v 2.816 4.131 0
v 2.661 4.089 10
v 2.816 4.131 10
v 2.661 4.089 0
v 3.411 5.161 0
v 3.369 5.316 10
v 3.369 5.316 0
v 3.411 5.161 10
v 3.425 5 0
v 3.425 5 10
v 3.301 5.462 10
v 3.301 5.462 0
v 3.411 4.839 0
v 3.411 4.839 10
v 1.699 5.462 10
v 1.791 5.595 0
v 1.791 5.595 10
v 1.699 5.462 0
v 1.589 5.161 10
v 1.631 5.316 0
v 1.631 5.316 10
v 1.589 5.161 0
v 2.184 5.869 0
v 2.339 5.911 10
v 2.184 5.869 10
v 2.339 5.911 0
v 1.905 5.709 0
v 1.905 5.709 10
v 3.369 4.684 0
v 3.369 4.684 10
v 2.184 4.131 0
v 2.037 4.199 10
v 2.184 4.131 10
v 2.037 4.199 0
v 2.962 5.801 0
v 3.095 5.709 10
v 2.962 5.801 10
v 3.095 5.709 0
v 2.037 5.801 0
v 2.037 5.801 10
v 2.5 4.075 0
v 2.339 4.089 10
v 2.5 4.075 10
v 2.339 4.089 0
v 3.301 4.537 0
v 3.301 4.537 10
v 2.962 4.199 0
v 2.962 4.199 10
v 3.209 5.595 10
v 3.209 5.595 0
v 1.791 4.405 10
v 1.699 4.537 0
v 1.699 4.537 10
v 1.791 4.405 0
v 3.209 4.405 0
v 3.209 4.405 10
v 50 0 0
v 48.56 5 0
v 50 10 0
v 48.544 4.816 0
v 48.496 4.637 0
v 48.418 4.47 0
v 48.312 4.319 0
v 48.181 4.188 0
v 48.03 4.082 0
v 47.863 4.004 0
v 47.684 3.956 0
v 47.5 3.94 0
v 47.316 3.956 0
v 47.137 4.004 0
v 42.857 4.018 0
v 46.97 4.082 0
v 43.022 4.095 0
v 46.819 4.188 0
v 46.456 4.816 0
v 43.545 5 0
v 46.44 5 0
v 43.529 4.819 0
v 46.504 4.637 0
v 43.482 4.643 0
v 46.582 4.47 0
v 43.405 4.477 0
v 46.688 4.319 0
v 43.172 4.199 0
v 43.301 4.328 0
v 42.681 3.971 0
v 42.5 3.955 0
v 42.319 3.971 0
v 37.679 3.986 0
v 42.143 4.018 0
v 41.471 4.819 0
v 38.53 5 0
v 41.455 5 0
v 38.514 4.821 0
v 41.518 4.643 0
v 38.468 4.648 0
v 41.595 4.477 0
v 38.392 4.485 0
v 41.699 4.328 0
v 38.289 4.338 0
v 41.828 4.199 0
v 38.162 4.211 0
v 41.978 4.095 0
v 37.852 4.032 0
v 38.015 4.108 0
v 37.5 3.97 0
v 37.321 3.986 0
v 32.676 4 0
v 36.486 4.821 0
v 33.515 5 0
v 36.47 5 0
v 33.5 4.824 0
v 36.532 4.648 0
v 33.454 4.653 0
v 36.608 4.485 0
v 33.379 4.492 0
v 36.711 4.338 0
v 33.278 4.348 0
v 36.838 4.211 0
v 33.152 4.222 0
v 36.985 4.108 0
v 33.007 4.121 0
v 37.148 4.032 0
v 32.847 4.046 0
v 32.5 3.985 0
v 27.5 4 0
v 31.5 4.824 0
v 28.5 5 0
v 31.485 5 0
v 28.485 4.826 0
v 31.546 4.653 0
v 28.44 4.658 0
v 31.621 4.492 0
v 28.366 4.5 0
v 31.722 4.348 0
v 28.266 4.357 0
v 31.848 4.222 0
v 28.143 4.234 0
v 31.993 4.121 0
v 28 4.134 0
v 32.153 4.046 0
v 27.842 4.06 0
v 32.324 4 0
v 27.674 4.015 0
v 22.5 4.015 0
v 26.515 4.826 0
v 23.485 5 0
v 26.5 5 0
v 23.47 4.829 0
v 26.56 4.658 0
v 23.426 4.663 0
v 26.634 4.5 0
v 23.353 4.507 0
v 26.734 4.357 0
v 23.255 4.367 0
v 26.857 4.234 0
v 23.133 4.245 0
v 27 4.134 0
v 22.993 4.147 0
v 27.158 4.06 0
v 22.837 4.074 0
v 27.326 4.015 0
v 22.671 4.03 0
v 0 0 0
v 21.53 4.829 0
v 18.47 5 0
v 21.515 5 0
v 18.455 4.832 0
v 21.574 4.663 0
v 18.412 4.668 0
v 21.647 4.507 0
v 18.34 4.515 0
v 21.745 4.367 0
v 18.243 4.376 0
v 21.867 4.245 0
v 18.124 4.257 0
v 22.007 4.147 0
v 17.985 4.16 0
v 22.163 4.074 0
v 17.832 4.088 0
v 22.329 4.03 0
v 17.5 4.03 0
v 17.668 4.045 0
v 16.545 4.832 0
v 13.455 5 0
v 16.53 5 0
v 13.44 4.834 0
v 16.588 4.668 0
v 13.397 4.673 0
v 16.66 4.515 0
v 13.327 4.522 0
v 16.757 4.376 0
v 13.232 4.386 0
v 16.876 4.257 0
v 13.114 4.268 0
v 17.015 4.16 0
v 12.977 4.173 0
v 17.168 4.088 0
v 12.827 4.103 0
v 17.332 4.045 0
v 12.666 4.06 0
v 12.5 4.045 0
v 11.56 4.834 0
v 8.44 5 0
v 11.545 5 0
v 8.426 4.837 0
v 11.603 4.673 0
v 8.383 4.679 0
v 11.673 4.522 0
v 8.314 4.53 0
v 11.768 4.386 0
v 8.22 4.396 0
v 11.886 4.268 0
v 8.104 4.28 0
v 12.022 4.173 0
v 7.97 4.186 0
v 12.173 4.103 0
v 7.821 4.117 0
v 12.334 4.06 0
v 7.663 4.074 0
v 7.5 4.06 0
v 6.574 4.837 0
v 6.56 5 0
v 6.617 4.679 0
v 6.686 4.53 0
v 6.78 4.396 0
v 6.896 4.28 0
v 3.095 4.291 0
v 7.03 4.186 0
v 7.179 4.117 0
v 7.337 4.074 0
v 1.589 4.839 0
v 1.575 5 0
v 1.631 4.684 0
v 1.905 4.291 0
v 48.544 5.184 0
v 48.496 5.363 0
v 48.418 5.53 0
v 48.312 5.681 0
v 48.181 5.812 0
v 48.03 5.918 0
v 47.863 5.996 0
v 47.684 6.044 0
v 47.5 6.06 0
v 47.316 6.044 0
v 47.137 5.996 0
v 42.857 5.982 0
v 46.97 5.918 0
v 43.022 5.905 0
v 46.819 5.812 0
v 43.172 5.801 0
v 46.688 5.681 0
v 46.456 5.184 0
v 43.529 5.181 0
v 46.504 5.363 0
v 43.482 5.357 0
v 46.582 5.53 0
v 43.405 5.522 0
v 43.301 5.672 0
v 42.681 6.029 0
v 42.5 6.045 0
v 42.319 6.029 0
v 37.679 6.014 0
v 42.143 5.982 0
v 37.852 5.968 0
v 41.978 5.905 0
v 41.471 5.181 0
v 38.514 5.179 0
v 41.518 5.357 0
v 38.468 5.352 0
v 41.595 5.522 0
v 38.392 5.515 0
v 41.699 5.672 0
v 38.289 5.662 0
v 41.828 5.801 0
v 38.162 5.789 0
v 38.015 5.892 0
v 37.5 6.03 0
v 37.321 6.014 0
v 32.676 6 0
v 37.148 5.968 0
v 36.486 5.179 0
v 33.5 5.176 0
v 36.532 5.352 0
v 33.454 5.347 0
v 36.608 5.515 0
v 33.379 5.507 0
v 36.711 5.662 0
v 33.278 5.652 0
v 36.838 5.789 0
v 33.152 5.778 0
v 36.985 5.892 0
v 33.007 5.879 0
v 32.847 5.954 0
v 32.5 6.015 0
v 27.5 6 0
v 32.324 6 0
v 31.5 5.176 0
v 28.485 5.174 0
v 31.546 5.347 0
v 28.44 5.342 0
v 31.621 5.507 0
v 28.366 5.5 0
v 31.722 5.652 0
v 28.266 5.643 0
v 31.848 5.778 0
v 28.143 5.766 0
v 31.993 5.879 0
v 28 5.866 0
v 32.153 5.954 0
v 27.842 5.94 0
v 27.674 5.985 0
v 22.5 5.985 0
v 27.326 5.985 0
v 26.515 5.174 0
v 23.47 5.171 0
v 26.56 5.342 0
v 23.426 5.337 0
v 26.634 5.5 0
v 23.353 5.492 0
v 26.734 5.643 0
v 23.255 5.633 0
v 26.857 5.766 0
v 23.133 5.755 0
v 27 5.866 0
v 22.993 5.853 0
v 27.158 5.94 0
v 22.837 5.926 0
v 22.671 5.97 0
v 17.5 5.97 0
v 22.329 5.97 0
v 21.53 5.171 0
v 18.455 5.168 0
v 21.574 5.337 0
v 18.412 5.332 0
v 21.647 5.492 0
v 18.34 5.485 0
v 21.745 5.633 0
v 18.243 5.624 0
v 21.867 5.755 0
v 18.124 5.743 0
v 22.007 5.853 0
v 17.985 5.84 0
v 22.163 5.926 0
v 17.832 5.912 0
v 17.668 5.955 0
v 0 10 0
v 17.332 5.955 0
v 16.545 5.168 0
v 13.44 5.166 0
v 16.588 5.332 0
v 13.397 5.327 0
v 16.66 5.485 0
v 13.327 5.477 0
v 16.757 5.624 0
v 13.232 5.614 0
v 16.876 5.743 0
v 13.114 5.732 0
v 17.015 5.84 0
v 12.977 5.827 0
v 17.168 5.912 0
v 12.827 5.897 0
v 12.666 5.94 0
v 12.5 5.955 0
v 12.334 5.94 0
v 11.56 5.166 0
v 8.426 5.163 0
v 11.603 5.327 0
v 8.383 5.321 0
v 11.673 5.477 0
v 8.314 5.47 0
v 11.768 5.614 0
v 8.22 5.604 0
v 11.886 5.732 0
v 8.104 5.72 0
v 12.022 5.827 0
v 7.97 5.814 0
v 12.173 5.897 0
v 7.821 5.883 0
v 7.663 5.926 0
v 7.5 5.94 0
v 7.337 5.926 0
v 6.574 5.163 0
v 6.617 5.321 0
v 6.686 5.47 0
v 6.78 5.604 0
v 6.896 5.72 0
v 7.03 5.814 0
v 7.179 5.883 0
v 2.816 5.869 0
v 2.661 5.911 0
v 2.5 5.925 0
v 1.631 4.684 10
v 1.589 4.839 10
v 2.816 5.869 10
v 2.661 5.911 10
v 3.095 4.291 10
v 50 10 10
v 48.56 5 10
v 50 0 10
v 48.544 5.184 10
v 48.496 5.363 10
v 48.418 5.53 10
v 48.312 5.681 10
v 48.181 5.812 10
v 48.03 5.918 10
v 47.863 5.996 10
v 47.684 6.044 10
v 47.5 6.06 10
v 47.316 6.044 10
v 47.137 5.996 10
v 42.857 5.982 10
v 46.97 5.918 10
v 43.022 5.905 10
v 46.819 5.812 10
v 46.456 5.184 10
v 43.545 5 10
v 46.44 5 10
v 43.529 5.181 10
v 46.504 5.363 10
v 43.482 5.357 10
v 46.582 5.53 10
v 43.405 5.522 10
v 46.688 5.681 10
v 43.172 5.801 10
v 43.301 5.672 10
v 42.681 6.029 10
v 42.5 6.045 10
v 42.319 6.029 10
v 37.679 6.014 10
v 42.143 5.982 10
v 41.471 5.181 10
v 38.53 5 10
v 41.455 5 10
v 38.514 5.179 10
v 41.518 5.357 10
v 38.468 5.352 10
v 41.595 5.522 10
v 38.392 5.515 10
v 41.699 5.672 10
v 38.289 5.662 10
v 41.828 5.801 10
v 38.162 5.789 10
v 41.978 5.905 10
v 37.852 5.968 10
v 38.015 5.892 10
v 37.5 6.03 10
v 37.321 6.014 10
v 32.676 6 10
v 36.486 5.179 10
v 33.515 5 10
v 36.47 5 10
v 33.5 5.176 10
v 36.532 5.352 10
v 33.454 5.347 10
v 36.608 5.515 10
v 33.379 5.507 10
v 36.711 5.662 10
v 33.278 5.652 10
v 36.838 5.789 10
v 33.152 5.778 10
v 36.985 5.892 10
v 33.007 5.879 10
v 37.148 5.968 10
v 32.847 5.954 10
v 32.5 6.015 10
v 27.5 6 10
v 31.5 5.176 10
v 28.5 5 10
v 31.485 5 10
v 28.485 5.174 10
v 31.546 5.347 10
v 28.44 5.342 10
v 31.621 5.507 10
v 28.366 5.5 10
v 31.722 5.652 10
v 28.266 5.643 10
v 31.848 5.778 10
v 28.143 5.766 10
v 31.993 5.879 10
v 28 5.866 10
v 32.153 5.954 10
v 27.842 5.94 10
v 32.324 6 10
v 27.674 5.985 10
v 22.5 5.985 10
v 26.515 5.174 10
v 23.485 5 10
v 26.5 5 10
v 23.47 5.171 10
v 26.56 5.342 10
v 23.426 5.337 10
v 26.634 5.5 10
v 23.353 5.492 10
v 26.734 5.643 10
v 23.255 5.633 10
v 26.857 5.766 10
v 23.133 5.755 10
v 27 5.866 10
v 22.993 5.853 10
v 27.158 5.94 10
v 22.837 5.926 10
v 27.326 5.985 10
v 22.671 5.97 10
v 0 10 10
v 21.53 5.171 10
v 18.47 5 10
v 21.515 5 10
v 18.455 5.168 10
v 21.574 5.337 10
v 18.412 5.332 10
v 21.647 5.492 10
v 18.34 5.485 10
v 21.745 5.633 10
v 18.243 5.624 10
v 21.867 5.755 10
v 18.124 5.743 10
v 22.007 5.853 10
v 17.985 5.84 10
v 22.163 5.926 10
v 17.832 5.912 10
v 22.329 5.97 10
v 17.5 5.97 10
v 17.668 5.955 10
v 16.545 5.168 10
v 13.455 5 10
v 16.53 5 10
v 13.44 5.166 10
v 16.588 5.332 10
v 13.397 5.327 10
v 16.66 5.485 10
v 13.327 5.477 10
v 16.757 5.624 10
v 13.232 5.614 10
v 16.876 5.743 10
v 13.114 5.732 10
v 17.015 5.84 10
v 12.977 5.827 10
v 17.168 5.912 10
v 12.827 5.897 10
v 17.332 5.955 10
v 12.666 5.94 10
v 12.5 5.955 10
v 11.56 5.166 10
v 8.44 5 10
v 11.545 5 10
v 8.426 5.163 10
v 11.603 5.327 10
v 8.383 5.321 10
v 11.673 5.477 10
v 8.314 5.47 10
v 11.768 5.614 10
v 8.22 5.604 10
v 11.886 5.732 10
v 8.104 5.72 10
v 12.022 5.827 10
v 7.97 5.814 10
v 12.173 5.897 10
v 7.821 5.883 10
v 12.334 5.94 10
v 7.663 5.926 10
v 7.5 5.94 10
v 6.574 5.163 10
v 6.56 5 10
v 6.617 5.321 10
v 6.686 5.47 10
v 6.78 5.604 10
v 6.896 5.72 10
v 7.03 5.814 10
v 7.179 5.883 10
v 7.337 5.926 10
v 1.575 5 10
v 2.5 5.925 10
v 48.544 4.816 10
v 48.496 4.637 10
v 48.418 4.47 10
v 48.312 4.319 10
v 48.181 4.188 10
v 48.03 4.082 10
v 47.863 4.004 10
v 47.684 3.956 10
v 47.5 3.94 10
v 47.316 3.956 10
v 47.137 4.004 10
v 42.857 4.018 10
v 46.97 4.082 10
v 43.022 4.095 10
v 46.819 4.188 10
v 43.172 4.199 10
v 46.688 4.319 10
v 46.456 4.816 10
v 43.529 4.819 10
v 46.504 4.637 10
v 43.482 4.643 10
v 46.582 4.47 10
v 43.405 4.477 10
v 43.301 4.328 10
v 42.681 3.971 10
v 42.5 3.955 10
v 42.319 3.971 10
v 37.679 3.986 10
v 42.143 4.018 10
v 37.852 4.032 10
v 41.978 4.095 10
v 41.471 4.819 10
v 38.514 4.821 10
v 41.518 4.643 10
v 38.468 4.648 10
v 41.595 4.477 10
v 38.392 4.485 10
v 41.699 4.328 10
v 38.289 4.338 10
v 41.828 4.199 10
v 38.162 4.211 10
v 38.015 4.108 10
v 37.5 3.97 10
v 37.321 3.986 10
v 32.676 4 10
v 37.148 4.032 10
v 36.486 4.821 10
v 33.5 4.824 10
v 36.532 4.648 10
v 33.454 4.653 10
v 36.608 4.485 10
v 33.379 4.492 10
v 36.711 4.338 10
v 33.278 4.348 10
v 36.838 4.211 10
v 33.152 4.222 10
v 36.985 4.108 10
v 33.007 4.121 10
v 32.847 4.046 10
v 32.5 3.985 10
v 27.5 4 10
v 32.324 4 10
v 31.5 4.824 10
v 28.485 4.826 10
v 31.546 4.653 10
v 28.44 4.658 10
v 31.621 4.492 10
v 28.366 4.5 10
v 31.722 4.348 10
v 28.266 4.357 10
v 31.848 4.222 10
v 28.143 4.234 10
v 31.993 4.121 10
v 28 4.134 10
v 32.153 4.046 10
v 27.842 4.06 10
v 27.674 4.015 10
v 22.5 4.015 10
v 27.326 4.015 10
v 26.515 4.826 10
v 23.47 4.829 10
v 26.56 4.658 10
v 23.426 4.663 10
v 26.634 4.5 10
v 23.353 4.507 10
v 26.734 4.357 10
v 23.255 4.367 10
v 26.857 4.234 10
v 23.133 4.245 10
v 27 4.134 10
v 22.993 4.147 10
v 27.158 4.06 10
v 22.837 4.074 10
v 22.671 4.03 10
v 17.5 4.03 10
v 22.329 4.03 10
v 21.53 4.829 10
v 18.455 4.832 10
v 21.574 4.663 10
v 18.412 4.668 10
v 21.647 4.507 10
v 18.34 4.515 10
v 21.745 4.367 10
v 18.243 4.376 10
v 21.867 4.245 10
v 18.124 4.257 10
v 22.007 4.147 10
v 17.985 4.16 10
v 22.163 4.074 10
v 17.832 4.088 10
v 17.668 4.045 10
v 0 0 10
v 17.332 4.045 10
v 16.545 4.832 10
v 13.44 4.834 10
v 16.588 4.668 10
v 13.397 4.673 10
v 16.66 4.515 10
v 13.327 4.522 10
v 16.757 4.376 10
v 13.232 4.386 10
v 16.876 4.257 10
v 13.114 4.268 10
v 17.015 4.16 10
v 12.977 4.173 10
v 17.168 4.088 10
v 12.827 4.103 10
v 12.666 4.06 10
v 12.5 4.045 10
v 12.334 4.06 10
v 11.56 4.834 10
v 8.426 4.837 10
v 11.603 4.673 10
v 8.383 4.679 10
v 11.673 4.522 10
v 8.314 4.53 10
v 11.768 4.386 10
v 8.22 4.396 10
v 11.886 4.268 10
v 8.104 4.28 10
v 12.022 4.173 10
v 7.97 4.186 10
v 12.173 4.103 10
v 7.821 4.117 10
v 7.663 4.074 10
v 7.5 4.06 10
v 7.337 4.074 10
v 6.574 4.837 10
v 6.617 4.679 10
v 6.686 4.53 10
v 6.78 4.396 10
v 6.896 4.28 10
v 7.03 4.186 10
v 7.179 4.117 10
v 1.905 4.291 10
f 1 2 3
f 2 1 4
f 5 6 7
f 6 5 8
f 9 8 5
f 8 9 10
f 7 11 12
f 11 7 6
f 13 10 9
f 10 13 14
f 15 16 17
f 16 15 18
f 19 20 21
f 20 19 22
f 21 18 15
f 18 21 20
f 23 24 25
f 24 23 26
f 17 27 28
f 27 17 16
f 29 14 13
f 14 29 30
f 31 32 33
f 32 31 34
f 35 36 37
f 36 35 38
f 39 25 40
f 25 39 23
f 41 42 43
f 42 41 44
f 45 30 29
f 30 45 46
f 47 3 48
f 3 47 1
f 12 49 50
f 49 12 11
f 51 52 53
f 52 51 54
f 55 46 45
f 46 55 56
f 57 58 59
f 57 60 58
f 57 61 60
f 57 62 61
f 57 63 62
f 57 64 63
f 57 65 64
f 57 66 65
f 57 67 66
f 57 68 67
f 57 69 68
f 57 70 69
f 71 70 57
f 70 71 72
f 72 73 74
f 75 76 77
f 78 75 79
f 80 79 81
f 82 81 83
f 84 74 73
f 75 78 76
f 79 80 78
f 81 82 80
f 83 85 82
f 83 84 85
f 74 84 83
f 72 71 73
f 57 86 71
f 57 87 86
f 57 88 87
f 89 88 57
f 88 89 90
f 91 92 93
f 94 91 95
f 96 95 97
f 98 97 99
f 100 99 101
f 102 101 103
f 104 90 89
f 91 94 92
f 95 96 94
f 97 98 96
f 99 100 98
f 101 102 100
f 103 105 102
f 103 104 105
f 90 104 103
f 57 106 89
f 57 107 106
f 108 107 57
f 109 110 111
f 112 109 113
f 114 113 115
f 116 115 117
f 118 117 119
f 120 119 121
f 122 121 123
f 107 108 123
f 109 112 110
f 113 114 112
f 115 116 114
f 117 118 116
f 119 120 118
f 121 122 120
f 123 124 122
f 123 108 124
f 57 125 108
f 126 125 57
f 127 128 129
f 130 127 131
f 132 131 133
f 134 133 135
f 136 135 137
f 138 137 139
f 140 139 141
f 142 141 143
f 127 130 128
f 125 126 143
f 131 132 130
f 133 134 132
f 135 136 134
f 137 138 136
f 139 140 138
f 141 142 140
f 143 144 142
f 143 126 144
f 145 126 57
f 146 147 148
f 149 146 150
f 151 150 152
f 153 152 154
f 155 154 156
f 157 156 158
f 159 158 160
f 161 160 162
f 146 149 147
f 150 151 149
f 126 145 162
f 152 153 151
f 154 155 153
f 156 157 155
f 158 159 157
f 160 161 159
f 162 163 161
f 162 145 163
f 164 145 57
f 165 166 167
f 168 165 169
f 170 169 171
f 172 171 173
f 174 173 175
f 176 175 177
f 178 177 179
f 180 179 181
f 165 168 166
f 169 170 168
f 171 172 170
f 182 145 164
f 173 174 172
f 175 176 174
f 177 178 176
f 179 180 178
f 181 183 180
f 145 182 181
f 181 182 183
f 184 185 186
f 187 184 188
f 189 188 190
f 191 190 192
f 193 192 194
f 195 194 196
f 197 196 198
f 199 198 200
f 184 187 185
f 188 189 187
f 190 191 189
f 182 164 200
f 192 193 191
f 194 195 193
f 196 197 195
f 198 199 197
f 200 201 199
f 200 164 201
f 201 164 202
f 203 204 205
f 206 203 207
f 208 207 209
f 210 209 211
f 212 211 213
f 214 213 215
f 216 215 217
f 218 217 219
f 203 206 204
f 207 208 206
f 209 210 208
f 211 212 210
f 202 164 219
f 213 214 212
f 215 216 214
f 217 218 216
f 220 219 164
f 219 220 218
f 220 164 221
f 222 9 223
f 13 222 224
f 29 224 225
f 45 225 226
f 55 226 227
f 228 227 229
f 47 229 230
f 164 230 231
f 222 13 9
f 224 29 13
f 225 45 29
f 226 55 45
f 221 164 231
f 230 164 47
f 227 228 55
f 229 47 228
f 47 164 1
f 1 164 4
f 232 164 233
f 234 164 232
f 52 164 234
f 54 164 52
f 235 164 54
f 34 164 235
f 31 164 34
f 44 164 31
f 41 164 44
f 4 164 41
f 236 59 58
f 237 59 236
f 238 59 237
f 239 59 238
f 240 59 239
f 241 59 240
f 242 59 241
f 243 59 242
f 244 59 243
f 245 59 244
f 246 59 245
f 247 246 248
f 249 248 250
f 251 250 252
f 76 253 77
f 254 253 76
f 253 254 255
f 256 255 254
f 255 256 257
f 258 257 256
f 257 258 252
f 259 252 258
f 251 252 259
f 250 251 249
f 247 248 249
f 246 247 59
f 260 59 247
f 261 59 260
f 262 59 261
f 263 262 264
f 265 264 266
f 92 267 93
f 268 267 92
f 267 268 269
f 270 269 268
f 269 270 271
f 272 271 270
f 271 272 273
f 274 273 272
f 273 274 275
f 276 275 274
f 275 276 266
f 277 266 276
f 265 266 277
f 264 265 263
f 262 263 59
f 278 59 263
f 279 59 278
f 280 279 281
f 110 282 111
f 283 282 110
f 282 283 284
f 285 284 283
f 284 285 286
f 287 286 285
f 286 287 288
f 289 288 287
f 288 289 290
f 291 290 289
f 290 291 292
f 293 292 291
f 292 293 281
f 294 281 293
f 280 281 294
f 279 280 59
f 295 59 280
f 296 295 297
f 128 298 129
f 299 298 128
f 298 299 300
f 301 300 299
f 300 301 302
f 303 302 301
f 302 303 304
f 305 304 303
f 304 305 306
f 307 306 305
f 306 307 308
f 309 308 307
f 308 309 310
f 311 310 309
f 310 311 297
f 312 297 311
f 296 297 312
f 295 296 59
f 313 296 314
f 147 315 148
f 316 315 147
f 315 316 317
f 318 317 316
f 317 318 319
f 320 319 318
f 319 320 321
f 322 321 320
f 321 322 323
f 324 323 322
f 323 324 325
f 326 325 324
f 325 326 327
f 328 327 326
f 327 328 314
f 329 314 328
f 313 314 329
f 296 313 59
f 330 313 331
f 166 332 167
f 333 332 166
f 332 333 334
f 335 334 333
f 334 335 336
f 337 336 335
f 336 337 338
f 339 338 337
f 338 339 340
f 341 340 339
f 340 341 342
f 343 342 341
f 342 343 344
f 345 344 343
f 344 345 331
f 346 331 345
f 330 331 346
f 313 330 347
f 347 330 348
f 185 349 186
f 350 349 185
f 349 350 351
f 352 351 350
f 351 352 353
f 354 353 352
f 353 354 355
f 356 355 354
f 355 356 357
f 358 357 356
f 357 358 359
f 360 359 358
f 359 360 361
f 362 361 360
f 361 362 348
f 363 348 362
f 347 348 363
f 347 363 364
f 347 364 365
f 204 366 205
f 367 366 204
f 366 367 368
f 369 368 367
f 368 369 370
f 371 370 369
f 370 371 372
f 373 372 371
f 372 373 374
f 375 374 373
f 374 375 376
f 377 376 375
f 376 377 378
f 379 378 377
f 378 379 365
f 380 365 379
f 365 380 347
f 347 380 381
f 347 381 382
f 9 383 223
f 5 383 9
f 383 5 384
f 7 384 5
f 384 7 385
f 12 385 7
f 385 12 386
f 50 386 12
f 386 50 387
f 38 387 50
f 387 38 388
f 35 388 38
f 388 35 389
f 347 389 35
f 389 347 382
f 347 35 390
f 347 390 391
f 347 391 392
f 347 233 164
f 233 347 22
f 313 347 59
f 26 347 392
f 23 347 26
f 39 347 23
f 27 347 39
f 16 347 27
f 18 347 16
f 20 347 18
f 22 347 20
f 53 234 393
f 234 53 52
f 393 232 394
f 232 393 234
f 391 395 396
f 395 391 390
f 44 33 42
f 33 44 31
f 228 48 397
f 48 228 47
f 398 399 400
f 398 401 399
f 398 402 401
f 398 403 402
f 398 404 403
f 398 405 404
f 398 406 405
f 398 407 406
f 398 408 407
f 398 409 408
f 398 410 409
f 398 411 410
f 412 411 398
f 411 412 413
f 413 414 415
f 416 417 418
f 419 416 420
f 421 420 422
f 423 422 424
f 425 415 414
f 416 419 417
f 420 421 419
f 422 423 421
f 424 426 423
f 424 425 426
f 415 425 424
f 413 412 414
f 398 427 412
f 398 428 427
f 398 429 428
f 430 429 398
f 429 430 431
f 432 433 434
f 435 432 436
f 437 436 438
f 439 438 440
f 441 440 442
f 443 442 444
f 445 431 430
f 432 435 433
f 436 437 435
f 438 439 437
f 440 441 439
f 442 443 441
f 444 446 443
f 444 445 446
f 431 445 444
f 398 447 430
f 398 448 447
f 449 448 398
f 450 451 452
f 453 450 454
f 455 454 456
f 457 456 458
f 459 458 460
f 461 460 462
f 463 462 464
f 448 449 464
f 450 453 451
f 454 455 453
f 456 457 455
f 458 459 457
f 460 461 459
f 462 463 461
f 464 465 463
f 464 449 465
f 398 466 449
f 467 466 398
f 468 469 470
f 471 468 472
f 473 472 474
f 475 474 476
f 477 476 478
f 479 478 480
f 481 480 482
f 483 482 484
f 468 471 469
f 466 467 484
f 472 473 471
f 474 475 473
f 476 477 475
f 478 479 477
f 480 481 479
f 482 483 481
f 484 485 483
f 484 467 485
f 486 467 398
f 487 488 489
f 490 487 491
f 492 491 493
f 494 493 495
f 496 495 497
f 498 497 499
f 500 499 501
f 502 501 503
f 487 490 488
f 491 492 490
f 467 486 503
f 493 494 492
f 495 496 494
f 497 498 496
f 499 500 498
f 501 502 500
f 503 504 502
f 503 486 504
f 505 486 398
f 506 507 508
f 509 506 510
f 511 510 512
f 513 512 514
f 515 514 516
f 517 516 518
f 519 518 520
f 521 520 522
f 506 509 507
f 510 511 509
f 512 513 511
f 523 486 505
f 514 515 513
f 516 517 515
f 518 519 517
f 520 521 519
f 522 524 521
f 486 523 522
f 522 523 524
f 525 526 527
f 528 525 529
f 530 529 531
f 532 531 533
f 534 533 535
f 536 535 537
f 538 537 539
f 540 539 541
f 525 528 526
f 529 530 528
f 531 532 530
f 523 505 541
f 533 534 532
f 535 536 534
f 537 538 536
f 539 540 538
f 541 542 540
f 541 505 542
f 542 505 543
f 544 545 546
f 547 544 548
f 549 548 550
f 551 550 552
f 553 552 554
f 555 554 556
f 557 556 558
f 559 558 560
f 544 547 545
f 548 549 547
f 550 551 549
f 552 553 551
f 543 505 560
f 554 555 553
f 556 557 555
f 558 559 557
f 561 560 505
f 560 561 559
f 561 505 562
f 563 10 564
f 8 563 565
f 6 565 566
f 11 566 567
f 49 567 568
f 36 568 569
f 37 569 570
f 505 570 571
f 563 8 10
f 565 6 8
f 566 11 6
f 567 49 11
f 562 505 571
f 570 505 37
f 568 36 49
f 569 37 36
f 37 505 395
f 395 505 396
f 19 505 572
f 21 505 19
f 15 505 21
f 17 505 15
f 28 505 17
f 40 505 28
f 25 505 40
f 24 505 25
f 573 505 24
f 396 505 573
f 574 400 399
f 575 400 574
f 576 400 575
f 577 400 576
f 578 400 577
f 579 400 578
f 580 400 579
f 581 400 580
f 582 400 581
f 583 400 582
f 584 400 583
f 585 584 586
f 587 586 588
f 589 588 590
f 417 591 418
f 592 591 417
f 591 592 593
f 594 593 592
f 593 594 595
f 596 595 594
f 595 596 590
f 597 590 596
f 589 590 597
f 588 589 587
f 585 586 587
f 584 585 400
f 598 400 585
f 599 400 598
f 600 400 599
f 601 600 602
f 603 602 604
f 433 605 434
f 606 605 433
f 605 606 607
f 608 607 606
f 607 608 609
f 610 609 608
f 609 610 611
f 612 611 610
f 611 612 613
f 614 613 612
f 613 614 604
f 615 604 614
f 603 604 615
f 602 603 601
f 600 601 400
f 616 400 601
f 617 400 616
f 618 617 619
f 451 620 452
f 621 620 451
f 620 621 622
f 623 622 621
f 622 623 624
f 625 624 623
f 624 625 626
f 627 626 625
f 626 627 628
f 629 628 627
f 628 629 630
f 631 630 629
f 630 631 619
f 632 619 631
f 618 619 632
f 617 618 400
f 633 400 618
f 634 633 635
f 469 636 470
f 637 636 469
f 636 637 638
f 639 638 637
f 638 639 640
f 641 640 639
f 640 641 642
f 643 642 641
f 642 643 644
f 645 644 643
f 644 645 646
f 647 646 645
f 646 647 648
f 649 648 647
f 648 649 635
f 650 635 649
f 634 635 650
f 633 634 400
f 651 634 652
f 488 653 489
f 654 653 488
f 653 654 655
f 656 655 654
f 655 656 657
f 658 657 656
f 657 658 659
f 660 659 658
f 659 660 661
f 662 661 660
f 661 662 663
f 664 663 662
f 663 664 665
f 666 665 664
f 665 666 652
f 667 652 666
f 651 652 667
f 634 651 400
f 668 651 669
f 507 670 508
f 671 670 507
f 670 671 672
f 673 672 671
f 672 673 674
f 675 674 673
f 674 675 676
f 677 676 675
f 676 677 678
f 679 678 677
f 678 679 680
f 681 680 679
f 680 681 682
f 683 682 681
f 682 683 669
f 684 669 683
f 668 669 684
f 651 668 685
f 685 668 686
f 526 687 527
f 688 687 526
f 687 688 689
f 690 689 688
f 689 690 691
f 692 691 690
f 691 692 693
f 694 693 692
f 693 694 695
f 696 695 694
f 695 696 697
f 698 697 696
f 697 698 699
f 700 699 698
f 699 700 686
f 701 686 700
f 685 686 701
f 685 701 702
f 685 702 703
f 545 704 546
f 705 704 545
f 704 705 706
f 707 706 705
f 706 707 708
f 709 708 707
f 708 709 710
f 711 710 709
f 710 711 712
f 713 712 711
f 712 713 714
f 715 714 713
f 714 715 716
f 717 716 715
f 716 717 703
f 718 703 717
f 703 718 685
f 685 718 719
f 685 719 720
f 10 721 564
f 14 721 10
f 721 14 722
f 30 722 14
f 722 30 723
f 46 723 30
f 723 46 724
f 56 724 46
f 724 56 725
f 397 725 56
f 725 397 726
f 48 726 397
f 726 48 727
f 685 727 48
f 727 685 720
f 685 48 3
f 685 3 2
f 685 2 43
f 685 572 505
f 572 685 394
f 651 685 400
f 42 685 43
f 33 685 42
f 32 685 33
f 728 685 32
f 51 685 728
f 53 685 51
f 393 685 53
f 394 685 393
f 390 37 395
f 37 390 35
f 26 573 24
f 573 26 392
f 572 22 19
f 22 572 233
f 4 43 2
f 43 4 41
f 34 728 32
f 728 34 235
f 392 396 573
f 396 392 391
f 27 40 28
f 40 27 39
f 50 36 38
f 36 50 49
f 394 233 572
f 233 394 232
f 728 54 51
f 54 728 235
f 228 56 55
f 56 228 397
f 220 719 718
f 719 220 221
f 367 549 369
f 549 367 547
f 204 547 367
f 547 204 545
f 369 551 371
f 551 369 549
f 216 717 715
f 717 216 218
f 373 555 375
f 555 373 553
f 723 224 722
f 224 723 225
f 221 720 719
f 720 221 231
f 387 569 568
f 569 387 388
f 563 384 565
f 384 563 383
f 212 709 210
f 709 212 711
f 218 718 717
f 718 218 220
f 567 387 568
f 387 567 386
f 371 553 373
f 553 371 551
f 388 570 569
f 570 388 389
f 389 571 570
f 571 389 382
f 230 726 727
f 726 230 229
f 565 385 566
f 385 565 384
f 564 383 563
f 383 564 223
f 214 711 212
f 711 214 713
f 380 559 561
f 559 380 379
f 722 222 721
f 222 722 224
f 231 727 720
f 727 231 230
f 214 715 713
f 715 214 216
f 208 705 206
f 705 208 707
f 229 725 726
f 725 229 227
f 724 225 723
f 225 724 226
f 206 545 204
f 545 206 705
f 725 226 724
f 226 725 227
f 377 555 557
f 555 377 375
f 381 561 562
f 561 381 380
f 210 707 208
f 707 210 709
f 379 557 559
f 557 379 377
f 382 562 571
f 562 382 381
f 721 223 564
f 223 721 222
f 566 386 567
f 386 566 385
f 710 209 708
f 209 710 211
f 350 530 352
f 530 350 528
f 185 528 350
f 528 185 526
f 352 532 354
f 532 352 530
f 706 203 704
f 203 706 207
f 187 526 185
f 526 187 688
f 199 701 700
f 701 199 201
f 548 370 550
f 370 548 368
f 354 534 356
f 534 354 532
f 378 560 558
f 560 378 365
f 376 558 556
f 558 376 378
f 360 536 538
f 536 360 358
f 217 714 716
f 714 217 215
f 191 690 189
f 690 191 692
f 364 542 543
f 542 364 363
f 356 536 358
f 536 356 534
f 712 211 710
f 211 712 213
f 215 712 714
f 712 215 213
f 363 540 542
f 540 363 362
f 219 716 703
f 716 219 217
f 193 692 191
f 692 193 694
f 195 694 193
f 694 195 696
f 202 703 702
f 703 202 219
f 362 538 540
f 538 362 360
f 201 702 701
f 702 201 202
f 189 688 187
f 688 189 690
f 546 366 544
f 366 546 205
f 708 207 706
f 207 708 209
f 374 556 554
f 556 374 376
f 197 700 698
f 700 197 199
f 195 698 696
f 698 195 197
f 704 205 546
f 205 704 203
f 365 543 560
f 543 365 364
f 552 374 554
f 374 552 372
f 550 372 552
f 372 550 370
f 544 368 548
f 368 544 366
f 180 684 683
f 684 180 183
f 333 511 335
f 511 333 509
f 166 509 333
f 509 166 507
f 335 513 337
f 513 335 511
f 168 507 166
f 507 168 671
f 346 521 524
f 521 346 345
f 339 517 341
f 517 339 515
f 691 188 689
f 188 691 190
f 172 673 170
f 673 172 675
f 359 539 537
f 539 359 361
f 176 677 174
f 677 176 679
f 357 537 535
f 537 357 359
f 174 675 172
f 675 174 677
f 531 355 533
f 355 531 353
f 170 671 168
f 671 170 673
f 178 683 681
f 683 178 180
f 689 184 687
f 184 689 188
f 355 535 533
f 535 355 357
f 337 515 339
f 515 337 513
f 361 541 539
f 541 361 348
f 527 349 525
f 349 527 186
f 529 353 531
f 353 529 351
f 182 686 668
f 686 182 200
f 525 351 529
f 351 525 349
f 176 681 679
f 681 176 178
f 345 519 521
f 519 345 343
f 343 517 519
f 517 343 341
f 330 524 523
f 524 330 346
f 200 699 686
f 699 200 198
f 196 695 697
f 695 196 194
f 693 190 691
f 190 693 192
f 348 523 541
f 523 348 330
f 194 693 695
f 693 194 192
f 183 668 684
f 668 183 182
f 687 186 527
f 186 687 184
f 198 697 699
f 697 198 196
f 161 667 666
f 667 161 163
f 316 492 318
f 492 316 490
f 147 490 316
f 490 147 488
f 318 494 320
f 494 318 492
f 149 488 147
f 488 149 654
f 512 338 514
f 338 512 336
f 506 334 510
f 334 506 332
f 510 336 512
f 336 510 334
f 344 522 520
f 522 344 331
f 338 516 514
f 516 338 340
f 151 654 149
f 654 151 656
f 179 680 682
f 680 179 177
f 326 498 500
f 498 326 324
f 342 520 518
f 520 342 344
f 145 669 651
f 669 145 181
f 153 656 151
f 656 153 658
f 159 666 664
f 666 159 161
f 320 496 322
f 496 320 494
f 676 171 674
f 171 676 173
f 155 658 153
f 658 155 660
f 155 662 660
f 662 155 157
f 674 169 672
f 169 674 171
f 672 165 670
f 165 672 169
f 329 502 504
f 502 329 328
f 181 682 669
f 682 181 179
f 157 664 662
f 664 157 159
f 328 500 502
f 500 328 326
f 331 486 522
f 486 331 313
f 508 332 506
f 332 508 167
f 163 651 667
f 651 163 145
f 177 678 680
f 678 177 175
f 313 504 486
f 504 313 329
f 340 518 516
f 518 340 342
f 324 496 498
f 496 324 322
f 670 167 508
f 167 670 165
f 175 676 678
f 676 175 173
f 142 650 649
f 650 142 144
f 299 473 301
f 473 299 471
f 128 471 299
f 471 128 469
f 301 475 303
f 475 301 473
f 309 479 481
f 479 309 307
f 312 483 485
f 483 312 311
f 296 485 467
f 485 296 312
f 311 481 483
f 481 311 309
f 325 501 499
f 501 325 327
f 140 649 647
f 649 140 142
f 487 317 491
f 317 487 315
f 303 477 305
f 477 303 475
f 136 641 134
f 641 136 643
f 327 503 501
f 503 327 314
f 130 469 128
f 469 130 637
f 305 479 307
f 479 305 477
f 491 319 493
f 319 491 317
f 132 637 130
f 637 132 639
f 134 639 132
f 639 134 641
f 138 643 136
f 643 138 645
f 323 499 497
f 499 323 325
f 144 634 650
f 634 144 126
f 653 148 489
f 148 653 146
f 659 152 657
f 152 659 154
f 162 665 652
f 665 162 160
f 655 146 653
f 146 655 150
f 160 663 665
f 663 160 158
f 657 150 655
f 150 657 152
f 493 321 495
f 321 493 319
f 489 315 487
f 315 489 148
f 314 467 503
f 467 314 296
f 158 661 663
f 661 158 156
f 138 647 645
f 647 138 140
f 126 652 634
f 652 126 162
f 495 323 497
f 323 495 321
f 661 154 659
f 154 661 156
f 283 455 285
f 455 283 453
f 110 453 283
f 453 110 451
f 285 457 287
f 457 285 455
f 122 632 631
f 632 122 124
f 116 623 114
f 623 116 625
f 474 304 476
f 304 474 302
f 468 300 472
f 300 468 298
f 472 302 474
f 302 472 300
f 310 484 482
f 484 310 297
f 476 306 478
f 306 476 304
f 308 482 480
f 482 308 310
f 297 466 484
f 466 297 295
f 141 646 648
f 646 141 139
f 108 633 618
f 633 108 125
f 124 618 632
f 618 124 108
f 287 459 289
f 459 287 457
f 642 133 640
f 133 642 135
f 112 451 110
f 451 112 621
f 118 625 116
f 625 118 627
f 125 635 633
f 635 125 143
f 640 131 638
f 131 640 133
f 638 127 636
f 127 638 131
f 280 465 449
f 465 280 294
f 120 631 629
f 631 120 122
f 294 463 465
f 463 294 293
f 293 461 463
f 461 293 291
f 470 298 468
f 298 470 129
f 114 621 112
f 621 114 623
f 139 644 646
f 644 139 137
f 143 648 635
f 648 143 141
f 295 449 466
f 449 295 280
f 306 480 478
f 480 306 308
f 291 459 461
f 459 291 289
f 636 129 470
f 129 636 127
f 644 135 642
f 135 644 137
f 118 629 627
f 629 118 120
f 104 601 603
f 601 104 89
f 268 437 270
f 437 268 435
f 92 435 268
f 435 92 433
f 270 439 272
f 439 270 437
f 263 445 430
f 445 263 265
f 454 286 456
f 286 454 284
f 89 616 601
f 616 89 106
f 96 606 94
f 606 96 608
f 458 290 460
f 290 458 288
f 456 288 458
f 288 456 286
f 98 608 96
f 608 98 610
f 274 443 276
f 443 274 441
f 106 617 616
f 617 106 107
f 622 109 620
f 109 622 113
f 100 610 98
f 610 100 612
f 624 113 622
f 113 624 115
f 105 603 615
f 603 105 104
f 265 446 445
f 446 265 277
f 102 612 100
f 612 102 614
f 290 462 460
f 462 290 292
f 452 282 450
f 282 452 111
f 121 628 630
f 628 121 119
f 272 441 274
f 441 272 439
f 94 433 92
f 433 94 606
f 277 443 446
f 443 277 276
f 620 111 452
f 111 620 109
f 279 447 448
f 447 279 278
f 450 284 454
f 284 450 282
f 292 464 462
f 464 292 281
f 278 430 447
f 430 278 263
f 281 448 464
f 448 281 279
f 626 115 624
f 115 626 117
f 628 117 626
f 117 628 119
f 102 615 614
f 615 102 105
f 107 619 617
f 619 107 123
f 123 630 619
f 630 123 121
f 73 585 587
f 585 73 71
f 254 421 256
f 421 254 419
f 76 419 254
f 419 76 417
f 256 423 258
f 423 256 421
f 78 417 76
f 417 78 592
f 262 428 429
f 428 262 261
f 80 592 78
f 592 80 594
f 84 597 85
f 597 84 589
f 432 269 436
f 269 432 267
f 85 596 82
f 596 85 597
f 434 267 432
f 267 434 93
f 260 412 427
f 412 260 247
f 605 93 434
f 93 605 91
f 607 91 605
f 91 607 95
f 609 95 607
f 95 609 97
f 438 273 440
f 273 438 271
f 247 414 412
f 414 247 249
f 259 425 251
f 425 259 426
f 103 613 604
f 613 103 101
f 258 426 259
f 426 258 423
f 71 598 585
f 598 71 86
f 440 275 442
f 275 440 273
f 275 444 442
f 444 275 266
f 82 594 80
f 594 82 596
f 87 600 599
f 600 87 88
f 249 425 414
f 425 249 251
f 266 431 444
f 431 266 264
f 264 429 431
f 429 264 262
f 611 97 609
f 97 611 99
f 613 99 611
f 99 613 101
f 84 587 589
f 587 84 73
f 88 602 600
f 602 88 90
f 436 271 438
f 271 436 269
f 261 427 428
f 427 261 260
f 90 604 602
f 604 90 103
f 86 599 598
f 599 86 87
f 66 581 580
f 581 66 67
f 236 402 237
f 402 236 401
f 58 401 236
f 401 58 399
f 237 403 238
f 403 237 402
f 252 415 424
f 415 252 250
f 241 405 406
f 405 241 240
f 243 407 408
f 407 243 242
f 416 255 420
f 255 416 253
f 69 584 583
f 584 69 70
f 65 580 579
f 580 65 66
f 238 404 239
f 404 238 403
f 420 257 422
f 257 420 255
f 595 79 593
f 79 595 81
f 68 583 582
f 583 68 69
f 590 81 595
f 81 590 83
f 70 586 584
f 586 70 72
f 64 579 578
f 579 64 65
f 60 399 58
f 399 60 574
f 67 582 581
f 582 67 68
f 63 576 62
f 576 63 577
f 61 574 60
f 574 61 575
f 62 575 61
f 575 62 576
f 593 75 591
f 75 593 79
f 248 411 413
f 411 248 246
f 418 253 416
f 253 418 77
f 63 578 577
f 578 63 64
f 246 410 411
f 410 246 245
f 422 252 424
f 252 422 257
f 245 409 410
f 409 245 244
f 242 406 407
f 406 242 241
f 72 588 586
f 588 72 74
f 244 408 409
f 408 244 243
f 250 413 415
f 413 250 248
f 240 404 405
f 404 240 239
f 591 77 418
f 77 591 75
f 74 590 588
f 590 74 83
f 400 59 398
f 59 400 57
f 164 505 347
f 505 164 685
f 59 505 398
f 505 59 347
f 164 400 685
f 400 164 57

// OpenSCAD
$fn=36;
$fs=.01;
space_per_hole=5;
holes=10;

difference(){
    cube([space_per_hole*holes,space_per_hole*2,10]);
    
    for (hole = [0:holes-1]) {
        offset = space_per_hole*hole+(space_per_hole/2);
        bore_offset=-.15+hole*.03;
        
        translate([offset,space_per_hole,0])
        cylinder(h=10,d=2+bore_offset);
    }
}
